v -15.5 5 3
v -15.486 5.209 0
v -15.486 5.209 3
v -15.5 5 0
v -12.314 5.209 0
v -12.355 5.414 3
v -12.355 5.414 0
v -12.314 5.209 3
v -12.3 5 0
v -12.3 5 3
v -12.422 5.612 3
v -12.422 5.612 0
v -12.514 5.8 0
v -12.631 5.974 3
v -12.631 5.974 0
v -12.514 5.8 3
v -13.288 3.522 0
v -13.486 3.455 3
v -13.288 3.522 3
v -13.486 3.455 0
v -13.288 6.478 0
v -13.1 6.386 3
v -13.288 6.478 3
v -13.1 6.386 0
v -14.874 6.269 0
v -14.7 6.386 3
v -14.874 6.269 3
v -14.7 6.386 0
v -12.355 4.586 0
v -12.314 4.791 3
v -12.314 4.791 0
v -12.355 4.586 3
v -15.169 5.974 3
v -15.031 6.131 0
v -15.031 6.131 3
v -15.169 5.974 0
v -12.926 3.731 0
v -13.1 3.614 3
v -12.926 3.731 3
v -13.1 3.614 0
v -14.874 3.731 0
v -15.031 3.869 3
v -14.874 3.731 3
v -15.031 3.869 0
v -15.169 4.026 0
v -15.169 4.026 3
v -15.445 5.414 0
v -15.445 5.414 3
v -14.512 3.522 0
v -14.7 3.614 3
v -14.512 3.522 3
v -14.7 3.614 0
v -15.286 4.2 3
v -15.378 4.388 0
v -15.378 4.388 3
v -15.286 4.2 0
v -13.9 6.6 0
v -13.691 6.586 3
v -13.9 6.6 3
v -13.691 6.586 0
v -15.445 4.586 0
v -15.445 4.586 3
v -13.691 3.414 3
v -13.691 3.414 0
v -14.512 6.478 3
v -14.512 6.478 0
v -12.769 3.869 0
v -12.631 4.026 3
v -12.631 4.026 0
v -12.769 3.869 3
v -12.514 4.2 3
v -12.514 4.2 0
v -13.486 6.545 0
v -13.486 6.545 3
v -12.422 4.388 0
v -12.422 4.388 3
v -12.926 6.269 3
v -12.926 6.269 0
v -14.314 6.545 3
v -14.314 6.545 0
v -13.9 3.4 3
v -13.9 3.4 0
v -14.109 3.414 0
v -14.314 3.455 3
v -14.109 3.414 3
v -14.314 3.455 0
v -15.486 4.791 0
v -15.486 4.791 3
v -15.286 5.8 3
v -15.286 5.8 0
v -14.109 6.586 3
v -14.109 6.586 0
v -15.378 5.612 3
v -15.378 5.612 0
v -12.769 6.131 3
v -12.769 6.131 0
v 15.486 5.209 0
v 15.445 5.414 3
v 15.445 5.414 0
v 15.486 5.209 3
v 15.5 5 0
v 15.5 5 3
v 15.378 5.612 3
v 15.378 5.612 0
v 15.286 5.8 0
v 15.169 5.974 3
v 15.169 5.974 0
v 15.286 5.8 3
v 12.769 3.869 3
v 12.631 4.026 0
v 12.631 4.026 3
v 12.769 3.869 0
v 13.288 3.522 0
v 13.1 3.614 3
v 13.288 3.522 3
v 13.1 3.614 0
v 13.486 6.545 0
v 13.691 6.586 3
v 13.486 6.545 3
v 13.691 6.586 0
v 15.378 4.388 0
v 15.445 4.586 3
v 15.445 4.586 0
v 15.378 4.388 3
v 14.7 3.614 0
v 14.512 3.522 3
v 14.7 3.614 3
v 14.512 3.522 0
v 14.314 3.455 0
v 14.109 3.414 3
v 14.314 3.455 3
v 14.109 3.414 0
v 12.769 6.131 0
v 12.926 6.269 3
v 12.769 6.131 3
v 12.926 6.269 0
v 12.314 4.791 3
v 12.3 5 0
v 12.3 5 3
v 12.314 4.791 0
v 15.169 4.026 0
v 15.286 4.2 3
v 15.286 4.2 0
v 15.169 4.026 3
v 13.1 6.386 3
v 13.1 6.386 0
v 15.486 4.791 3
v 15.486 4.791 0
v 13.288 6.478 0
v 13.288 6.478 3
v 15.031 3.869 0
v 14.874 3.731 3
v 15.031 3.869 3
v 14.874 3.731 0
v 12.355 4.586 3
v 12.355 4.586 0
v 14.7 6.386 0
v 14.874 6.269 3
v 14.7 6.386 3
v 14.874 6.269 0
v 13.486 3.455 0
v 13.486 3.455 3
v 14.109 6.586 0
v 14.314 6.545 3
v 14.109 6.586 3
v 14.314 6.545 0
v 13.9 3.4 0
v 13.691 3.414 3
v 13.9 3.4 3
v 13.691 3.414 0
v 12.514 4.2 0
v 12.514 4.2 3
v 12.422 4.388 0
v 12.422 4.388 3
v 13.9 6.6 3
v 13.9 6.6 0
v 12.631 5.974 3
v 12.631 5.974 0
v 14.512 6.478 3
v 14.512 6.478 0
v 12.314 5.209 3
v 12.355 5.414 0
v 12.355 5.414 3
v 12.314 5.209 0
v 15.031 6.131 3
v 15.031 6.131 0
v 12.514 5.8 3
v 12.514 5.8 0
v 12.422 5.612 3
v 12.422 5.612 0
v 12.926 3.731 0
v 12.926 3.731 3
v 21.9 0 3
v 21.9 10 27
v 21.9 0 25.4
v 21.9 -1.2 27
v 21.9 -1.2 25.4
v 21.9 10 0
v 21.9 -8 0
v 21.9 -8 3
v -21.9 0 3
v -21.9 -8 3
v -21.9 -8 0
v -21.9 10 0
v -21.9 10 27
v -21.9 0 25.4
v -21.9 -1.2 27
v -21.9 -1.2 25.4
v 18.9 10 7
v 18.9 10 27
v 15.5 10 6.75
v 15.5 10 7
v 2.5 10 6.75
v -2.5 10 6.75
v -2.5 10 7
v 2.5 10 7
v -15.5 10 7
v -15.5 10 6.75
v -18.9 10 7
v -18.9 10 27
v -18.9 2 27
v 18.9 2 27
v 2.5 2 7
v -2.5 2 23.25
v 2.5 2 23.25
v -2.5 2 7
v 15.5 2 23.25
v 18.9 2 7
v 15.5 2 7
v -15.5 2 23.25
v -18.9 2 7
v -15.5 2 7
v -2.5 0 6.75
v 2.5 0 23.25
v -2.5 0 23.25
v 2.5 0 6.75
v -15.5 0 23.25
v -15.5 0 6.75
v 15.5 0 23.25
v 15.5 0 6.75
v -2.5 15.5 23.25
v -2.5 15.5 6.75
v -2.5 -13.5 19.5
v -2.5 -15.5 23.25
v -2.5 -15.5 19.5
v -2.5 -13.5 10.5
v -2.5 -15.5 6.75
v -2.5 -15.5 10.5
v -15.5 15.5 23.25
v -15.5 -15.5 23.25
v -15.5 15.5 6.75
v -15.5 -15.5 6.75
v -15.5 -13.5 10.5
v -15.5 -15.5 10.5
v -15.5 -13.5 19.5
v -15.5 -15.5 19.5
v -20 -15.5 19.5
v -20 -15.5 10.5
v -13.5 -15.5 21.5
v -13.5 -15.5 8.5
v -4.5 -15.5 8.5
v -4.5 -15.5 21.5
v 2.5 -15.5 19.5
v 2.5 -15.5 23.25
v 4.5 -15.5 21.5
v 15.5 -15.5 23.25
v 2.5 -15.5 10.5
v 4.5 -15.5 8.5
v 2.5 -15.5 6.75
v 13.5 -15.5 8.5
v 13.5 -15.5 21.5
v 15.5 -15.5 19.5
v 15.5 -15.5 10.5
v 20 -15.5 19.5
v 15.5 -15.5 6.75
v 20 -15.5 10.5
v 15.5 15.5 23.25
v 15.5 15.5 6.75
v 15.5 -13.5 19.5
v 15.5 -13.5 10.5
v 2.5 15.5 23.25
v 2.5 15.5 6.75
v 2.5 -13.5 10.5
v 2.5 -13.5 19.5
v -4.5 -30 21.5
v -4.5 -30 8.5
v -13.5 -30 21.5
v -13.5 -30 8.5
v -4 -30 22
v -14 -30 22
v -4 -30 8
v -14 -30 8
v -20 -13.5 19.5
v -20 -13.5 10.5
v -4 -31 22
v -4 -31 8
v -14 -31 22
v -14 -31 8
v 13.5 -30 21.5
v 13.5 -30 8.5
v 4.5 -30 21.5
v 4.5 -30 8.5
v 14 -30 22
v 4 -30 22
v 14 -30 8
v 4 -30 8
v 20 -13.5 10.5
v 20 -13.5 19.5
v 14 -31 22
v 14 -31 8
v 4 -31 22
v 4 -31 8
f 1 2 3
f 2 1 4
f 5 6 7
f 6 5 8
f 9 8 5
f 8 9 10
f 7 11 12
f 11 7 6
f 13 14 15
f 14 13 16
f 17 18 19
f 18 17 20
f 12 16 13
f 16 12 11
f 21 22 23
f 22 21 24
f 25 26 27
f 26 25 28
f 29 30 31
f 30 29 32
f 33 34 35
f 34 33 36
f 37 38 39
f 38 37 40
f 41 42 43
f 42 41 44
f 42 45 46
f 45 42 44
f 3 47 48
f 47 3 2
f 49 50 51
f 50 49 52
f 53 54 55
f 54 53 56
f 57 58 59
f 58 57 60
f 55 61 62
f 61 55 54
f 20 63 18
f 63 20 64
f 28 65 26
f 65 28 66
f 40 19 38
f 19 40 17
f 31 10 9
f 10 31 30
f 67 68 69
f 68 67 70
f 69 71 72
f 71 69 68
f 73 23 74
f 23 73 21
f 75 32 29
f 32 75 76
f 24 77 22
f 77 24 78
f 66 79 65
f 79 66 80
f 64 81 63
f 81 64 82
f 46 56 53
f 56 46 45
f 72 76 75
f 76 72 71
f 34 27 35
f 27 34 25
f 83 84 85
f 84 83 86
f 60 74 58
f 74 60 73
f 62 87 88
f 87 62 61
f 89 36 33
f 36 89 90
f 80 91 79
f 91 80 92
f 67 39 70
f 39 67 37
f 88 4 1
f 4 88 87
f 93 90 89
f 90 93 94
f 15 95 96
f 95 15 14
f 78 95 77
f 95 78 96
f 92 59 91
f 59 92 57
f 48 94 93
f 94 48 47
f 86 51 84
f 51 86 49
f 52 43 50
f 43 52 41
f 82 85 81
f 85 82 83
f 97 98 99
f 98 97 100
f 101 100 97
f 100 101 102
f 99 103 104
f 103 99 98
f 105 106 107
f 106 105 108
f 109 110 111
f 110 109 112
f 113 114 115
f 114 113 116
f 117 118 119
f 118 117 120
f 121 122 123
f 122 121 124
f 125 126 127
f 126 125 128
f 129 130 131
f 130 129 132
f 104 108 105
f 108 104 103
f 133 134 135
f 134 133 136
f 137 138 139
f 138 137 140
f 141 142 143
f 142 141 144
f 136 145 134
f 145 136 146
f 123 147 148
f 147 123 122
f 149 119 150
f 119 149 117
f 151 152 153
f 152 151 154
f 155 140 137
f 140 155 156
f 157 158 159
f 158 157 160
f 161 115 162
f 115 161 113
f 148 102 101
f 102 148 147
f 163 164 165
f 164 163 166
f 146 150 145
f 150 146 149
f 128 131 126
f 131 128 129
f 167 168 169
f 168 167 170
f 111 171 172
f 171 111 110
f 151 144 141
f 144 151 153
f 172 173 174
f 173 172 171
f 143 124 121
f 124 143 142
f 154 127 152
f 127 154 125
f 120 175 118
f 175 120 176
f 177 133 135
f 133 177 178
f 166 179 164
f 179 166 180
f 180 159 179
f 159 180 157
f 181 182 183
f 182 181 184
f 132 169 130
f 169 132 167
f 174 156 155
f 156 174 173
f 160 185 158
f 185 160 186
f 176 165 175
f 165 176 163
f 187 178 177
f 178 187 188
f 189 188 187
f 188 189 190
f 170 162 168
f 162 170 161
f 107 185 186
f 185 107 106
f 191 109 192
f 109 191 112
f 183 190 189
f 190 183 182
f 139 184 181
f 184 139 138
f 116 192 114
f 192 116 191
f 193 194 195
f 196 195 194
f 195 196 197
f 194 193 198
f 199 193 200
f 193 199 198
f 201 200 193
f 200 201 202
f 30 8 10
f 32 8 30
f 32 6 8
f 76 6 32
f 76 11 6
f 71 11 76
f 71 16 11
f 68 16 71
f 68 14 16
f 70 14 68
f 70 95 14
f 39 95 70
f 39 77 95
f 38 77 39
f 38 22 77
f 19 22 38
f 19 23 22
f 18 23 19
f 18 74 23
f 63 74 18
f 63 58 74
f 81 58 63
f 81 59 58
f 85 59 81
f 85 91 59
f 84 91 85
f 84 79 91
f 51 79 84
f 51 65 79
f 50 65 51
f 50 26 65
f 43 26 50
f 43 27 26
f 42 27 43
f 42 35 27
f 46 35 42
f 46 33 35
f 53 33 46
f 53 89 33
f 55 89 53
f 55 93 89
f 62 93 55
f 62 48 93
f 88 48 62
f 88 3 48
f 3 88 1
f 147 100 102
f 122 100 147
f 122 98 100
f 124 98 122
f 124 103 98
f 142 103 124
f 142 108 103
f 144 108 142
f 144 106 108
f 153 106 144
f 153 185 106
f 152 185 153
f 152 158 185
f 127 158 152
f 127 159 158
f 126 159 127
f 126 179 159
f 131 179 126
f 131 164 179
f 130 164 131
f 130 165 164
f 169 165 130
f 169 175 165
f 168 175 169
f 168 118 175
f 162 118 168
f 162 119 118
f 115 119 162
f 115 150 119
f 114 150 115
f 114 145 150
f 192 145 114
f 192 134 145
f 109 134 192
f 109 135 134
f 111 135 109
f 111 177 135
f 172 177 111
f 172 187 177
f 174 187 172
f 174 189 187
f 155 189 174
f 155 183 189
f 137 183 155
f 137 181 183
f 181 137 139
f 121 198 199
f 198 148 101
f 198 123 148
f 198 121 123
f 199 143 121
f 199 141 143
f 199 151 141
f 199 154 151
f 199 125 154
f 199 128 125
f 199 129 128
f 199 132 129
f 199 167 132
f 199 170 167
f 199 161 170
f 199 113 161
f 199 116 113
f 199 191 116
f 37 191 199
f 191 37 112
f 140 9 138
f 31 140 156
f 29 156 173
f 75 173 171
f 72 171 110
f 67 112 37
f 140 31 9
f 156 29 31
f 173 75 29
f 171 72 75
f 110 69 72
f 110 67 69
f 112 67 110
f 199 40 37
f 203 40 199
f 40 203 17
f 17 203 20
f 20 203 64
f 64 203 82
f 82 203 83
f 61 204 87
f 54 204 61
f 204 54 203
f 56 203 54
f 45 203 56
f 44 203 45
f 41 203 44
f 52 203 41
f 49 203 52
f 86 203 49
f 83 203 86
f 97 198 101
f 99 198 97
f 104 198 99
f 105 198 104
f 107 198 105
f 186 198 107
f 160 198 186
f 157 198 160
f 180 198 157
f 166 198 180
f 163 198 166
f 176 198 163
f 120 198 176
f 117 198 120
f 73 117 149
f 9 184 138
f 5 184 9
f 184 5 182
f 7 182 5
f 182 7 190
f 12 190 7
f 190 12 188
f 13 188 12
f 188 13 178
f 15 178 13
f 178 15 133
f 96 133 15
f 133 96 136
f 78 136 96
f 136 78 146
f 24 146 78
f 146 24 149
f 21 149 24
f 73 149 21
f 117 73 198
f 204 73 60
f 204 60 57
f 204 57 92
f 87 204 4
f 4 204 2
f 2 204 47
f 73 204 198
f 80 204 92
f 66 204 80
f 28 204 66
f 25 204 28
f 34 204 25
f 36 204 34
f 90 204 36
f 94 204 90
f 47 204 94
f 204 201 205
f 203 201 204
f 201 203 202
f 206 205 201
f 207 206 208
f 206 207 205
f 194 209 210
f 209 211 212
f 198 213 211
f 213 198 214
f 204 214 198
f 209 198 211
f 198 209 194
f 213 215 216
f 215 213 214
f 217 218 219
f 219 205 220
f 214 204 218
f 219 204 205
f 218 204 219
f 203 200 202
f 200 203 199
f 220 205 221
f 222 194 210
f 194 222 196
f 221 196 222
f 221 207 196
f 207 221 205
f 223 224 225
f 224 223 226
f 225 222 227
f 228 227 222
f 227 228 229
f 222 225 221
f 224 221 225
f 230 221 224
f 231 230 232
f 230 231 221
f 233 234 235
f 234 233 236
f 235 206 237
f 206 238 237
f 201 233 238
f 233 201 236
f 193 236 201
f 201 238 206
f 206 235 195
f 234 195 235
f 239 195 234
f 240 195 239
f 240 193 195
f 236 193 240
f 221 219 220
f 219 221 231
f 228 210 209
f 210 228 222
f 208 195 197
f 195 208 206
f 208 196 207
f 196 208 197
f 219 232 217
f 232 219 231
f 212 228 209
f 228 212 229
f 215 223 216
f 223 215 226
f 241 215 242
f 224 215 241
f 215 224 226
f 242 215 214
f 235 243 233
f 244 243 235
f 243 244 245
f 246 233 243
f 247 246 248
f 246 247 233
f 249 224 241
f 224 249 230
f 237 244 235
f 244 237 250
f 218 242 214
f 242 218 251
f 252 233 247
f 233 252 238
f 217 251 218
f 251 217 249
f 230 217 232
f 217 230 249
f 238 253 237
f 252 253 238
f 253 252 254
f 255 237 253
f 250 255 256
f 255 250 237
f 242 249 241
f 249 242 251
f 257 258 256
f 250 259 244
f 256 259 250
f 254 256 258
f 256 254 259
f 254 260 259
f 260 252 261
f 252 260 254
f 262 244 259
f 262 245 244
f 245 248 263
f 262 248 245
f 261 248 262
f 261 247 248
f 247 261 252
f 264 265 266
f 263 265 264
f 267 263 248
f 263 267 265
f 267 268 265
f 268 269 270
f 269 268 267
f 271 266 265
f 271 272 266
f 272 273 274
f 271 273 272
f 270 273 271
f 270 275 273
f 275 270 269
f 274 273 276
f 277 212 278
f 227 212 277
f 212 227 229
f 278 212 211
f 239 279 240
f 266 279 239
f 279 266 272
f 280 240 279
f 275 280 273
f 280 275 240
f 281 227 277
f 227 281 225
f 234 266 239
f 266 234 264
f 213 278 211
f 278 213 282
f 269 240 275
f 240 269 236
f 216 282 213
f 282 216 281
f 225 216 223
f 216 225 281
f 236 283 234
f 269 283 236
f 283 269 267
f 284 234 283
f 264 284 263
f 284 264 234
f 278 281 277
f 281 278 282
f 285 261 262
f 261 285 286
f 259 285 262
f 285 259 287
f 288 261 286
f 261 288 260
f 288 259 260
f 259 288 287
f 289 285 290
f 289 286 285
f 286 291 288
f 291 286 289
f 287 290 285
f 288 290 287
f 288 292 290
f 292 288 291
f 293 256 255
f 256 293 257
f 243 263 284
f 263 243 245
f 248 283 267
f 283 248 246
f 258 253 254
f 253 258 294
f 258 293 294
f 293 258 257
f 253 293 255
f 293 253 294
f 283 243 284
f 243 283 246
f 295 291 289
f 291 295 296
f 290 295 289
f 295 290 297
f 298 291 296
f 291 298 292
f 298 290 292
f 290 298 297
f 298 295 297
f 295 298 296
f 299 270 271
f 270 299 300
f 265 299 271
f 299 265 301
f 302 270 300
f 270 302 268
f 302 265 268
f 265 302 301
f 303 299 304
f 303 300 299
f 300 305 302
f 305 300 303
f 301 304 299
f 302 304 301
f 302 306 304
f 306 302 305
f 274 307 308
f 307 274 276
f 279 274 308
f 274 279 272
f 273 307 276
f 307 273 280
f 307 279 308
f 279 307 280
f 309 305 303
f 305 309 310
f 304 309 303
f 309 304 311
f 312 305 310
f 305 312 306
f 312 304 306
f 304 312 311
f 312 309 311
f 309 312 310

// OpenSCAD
/*
  SC/APC Simplex Fiber Adapter Holder - Test Print V2

  Designed for common flanged SC/APC female-to-female simplex couplers.
  This version uses a THIN 2mm face plate so the coupler snap/flange area is not buried in thick plastic.

  Print this standalone part first and test-fit your green SC/APC coupler.

  Orientation:
  - The SC adapter slides through the rectangular window.
  - Fiber plugs connect from the front/back of this holder.
  - No box wall holes are modeled here; this is only the internal holder.
*/

$fn = 48;

/* [Main settings] */
SC_Count = 2;
SC_Pitch = 18;                 // center-to-center distance between adapters

// Thin panel that the SC adapters snap/seat into
Panel_Thickness = 2.0;         // keep thin; most SC couplers do not like thick panels
Panel_Height = 24;
Panel_Top_Margin = 5;
Panel_Bottom_Margin = 5;
Side_Margin = 8;

// SC/APC simplex adapter window; tune these after test-fit
SC_Window_W = 9.8;             // adapter narrow dimension + clearance
SC_Window_H = 13.4;            // adapter tall dimension + clearance
Corner_Radius = 0.8;

// Clearance space behind/front of panel so the coupler body is not pinched
Adapter_Clearance_Length = 35; // common couplers are about 31mm long
Clearance_W = 13.0;
Clearance_H = 16.5;

/* [Mounting base] */
Base_Thickness = 3;
Base_Depth = 18;
Base_Front_Overhang = 8;
Base_Back_Overhang = 8;
Mount_Hole_Dia = 3.2;          // M3 clearance
Mount_Hole_Offset_X = 8;
Mount_Hole_Offset_Y = 5;

/* [Retainer features] */
Add_Top_Retainer_Lip = true;
Retainer_Lip_Depth = 1.2;
Retainer_Lip_Height = 1.6;

/* [Visualization] */
Show_Mock_Adapters = true;     // turn false before exporting STL if desired
Mock_Length = 31;
Mock_Flange_W = 22;
Mock_Flange_H = 9;
Mock_Body_W = 9;
Mock_Body_H = 13;

Holder_W = (SC_Count - 1) * SC_Pitch + SC_Window_W + Side_Margin * 2;
Panel_Z = Base_Thickness;
Panel_W = Holder_W;
Panel_D = Panel_Thickness;

module rounded_rect_2d(w, h, r) {
    hull() {
        translate([ w/2-r,  h/2-r]) circle(r=r);
        translate([-w/2+r,  h/2-r]) circle(r=r);
        translate([ w/2-r, -h/2+r]) circle(r=r);
        translate([-w/2+r, -h/2+r]) circle(r=r);
    }
}

module rounded_window_cut(w, h, depth, r) {
    linear_extrude(height=depth + 0.4)
        rounded_rect_2d(w, h, r);
}

function sc_x(i) = -((SC_Count - 1) * SC_Pitch) / 2 + i * SC_Pitch;

module base_with_mounting_holes() {
    difference() {
        translate([-Holder_W/2, -Base_Front_Overhang, 0])
            cube([Holder_W, Base_Depth, Base_Thickness]);

        // mounting holes in the base tabs
        for (sx = [-1, 1]) {
            translate([sx * (Holder_W/2 - Mount_Hole_Offset_X), Mount_Hole_Offset_Y, -0.1])
                cylinder(d=Mount_Hole_Dia, h=Base_Thickness + 0.2);
        }
    }
}

module thin_sc_panel() {
    difference() {
        // main thin panel
        translate([-Panel_W/2, 0, Panel_Z])
            cube([Panel_W, Panel_D, Panel_Height]);

        // rectangular SC adapter windows
        for (i = [0:SC_Count-1]) {
            translate([sc_x(i), -0.2, Panel_Z + Panel_Height/2])
                rotate([-90, 0, 0])
                    rounded_window_cut(SC_Window_W, SC_Window_H, Panel_D + 0.4, Corner_Radius);
        }
    }

    // side supports / ribs, kept away from adapter body path
    translate([-Panel_W/2, 0, Panel_Z])
        cube([3, Base_Depth - Base_Front_Overhang, Panel_Height]);
    translate([Panel_W/2 - 3, 0, Panel_Z])
        cube([3, Base_Depth - Base_Front_Overhang, Panel_Height]);

    // small top retainer lip similar to molded fiber-box holders
    if (Add_Top_Retainer_Lip) {
        translate([-Panel_W/2, -Retainer_Lip_Depth, Panel_Z + Panel_Height - Retainer_Lip_Height])
            cube([Panel_W, Retainer_Lip_Depth, Retainer_Lip_Height]);
    }
}

module clearance_gauge() {
    // A non-printing visual reference showing free space needed for coupler body.
    // It is colored transparent in preview. It does not subtract anything because the design is already open.
    for (i = [0:SC_Count-1]) {
        color([1, 0.7, 0, 0.18])
            translate([sc_x(i) - Clearance_W/2, -Mock_Length/2, Panel_Z + Panel_Height/2 - Clearance_H/2])
                cube([Clearance_W, Mock_Length, Clearance_H]);
    }
}

module mock_sc_adapter() {
    // crude dimensional mockup for preview only
    for (i = [0:SC_Count-1]) {
        translate([sc_x(i), -Mock_Length/2 + Panel_D/2, Panel_Z + Panel_Height/2]) {
            color("green")
                cube([Mock_Body_W, Mock_Length, Mock_Body_H], center=true);
            color("limegreen")
                cube([Mock_Flange_W, 2.0, Mock_Flange_H], center=true);
            color("black")
                translate([0, -Mock_Length/2 - 0.5, 0])
                    cube([Mock_Body_W + 1, 1, Mock_Body_H + 1], center=true);
            color("black")
                translate([0, Mock_Length/2 + 0.5, 0])
                    cube([Mock_Body_W + 1, 1, Mock_Body_H + 1], center=true);
        }
    }
}

module sc_holder_v2() {
    base_with_mounting_holes();
    thin_sc_panel();

    // extra low back brace, below the SC windows
    translate([-Panel_W/2, Panel_D, Panel_Z])
        cube([Panel_W, Base_Back_Overhang, 4]);
}

sc_holder_v2();

if (Show_Mock_Adapters) {
    clearance_gauge();
    mock_sc_adapter();
}
